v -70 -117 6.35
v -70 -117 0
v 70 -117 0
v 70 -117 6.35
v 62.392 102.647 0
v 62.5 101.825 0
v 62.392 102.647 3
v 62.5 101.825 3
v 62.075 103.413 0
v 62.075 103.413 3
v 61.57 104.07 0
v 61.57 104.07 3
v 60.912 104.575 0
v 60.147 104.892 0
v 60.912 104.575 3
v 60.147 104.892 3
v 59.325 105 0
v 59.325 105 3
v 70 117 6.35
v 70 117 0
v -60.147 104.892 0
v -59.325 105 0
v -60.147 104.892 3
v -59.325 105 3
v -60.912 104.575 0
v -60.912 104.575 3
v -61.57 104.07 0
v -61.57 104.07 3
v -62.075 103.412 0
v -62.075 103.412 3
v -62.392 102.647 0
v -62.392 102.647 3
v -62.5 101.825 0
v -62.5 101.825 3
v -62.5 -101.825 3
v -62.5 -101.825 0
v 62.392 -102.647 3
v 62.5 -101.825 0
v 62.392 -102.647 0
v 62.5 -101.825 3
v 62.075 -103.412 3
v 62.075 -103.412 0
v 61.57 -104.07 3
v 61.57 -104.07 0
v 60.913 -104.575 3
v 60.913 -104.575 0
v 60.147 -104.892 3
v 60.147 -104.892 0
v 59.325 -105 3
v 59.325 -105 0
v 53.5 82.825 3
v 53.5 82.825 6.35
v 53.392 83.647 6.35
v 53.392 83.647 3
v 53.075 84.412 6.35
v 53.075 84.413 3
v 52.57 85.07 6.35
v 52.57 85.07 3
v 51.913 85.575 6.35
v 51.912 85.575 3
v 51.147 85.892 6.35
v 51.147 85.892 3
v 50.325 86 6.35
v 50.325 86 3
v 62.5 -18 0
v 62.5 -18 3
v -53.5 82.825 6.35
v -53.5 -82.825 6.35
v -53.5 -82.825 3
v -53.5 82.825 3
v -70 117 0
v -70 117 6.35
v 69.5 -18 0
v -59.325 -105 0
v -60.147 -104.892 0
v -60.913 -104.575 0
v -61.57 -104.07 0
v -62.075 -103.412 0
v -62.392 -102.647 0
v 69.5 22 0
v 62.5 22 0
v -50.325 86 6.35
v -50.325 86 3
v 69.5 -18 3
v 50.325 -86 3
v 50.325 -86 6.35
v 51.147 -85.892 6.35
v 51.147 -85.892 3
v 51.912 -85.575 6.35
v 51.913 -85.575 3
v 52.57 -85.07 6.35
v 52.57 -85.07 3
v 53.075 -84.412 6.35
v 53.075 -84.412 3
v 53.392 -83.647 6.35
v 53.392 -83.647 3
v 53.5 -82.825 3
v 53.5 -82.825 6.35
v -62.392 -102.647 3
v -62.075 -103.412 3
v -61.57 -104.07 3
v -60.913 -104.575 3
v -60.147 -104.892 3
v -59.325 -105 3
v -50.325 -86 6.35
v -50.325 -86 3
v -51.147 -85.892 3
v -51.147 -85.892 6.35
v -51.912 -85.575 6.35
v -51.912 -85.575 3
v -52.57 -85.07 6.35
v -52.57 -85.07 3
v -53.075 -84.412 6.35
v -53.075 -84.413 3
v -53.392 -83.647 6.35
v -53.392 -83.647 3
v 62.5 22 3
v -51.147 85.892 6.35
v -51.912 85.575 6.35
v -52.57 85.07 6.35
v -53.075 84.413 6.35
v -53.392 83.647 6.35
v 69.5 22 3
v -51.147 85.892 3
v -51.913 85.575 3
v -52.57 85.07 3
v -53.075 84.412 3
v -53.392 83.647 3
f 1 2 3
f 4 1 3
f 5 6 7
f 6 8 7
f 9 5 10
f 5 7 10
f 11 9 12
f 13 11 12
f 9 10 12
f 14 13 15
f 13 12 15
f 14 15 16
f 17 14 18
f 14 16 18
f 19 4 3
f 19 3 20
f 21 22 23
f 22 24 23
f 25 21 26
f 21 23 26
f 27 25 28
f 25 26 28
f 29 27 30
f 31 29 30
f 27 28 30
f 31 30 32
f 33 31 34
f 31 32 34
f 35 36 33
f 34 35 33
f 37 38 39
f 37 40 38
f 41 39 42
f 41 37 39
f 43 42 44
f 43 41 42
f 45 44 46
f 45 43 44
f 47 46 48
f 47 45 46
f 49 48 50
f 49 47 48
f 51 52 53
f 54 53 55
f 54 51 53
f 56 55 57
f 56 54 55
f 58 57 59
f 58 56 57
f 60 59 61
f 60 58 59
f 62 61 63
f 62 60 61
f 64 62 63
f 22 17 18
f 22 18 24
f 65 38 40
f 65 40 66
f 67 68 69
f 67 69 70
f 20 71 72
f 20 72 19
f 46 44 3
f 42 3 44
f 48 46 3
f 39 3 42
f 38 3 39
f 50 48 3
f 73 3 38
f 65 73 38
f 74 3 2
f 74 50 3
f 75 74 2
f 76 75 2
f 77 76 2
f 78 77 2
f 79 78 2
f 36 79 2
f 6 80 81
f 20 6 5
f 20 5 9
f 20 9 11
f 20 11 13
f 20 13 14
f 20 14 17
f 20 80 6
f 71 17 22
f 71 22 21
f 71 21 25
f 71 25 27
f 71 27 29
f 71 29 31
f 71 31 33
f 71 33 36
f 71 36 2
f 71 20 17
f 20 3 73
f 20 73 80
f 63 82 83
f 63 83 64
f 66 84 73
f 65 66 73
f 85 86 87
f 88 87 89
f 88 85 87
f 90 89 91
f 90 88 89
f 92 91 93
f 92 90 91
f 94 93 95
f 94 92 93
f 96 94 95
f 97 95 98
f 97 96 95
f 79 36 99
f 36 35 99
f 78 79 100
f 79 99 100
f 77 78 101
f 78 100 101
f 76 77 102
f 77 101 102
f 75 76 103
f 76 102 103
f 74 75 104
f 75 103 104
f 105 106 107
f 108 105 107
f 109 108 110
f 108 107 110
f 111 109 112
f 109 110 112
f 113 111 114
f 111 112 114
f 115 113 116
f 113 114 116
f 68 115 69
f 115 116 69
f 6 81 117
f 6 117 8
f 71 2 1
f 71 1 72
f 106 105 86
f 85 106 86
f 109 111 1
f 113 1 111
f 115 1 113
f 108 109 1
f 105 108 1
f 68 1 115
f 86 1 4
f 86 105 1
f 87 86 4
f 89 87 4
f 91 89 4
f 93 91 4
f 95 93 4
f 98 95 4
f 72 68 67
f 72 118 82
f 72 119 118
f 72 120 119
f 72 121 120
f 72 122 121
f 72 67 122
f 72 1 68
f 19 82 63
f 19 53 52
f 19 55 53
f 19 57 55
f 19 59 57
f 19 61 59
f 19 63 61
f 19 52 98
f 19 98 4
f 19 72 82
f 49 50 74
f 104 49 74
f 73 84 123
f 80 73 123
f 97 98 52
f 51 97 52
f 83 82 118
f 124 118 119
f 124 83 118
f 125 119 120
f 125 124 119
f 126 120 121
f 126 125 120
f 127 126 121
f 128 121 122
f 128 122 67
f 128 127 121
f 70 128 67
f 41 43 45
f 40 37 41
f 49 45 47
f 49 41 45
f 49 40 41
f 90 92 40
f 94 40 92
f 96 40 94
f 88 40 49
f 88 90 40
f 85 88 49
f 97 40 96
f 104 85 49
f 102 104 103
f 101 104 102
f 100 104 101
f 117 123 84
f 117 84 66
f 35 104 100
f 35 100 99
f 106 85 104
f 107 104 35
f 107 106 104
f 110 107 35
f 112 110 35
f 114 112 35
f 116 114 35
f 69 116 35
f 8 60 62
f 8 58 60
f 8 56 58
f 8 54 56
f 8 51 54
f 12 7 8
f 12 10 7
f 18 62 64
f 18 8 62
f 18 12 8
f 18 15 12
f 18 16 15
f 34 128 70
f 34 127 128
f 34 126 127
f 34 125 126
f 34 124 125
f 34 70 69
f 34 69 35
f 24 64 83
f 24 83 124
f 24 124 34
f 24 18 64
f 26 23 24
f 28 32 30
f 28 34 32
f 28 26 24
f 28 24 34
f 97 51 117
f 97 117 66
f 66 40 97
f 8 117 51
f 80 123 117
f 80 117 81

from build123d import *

# Parameters (mm, degrees)
SKETCH1_W           = 140
SKETCH1_H           = 234
BOSS_EXTRUDE1_DEPTH = 6.35
SKETCH2_W           = 107
SKETCH2_H           = 172
CUT_EXTRUDE1_DEPTH  = 137.489276136
FILLET1_R           = 3.175
SKETCH3_W           = 125
SKETCH3_H           = 210
CUT_EXTRUDE2_DEPTH  = 3
FILLET2_R           = 3.175
SKETCH5_W           = 6
SKETCH5_H           = 40
CUT_EXTRUDE4_DEPTH  = 20
SKETCH6_W           = 0.5
SKETCH6_H           = 40
BOSS_EXTRUDE2_DEPTH = 3


with BuildPart() as part:
    # Sketch1 → Boss-Extrude1 (new body)
    with BuildSketch(Plane.XY):
        Rectangle(SKETCH1_W, SKETCH1_H)
    extrude(amount=BOSS_EXTRUDE1_DEPTH)

    # Sketch2 → Cut-Extrude1 (cut, through all)
    with BuildSketch(Plane.XY.offset(6.35)):
        Rectangle(SKETCH2_W, SKETCH2_H)
    extrude(amount=-CUT_EXTRUDE1_DEPTH, mode=Mode.SUBTRACT)

    # Fillet1
    fillet1_edges = [part.edges().sort_by_distance(p)[0] for p in [
        (53.5, 86, 3.175),
        (53.5, -86, 3.175),
        (-53.5, -86, 3.175),
        (-53.5, 86, 3.175),
    ]]
    fillet(fillet1_edges, radius=FILLET1_R)

    # Sketch3 → Cut-Extrude2 (cut)
    with BuildSketch(Plane(origin=(0, 0, 0), x_dir=(-1, 0, 0), z_dir=(0, 0, -1))):
        Rectangle(SKETCH3_W, SKETCH3_H)
    extrude(amount=-CUT_EXTRUDE2_DEPTH, mode=Mode.SUBTRACT)

    # Fillet2
    fillet2_edges = [part.edges().sort_by_distance(p)[0] for p in [
        (-62.5, 105, 1.5),
        (-62.5, -105, 1.5),
        (62.5, -105, 1.5),
        (62.5, 105, 1.5),
    ]]
    fillet(fillet2_edges, radius=FILLET2_R)

    # Sketch5 → Cut-Extrude4 (cut)
    with BuildSketch(Plane(origin=(70, 0, 0), x_dir=(0, 0, -1), z_dir=(1, 0, 0))):
        with Locations((0, 2)):
            Rectangle(SKETCH5_W, SKETCH5_H)
    extrude(amount=-CUT_EXTRUDE4_DEPTH, mode=Mode.SUBTRACT)

    # Sketch6 → Boss-Extrude2 (add)
    with BuildSketch(Plane(origin=(0, 0, 3), x_dir=(-1, 0, 0), z_dir=(0, 0, -1))):
        with Locations((-69.75, 2)):
            Rectangle(SKETCH6_W, SKETCH6_H)
    extrude(amount=BOSS_EXTRUDE2_DEPTH)


solid = part.part
